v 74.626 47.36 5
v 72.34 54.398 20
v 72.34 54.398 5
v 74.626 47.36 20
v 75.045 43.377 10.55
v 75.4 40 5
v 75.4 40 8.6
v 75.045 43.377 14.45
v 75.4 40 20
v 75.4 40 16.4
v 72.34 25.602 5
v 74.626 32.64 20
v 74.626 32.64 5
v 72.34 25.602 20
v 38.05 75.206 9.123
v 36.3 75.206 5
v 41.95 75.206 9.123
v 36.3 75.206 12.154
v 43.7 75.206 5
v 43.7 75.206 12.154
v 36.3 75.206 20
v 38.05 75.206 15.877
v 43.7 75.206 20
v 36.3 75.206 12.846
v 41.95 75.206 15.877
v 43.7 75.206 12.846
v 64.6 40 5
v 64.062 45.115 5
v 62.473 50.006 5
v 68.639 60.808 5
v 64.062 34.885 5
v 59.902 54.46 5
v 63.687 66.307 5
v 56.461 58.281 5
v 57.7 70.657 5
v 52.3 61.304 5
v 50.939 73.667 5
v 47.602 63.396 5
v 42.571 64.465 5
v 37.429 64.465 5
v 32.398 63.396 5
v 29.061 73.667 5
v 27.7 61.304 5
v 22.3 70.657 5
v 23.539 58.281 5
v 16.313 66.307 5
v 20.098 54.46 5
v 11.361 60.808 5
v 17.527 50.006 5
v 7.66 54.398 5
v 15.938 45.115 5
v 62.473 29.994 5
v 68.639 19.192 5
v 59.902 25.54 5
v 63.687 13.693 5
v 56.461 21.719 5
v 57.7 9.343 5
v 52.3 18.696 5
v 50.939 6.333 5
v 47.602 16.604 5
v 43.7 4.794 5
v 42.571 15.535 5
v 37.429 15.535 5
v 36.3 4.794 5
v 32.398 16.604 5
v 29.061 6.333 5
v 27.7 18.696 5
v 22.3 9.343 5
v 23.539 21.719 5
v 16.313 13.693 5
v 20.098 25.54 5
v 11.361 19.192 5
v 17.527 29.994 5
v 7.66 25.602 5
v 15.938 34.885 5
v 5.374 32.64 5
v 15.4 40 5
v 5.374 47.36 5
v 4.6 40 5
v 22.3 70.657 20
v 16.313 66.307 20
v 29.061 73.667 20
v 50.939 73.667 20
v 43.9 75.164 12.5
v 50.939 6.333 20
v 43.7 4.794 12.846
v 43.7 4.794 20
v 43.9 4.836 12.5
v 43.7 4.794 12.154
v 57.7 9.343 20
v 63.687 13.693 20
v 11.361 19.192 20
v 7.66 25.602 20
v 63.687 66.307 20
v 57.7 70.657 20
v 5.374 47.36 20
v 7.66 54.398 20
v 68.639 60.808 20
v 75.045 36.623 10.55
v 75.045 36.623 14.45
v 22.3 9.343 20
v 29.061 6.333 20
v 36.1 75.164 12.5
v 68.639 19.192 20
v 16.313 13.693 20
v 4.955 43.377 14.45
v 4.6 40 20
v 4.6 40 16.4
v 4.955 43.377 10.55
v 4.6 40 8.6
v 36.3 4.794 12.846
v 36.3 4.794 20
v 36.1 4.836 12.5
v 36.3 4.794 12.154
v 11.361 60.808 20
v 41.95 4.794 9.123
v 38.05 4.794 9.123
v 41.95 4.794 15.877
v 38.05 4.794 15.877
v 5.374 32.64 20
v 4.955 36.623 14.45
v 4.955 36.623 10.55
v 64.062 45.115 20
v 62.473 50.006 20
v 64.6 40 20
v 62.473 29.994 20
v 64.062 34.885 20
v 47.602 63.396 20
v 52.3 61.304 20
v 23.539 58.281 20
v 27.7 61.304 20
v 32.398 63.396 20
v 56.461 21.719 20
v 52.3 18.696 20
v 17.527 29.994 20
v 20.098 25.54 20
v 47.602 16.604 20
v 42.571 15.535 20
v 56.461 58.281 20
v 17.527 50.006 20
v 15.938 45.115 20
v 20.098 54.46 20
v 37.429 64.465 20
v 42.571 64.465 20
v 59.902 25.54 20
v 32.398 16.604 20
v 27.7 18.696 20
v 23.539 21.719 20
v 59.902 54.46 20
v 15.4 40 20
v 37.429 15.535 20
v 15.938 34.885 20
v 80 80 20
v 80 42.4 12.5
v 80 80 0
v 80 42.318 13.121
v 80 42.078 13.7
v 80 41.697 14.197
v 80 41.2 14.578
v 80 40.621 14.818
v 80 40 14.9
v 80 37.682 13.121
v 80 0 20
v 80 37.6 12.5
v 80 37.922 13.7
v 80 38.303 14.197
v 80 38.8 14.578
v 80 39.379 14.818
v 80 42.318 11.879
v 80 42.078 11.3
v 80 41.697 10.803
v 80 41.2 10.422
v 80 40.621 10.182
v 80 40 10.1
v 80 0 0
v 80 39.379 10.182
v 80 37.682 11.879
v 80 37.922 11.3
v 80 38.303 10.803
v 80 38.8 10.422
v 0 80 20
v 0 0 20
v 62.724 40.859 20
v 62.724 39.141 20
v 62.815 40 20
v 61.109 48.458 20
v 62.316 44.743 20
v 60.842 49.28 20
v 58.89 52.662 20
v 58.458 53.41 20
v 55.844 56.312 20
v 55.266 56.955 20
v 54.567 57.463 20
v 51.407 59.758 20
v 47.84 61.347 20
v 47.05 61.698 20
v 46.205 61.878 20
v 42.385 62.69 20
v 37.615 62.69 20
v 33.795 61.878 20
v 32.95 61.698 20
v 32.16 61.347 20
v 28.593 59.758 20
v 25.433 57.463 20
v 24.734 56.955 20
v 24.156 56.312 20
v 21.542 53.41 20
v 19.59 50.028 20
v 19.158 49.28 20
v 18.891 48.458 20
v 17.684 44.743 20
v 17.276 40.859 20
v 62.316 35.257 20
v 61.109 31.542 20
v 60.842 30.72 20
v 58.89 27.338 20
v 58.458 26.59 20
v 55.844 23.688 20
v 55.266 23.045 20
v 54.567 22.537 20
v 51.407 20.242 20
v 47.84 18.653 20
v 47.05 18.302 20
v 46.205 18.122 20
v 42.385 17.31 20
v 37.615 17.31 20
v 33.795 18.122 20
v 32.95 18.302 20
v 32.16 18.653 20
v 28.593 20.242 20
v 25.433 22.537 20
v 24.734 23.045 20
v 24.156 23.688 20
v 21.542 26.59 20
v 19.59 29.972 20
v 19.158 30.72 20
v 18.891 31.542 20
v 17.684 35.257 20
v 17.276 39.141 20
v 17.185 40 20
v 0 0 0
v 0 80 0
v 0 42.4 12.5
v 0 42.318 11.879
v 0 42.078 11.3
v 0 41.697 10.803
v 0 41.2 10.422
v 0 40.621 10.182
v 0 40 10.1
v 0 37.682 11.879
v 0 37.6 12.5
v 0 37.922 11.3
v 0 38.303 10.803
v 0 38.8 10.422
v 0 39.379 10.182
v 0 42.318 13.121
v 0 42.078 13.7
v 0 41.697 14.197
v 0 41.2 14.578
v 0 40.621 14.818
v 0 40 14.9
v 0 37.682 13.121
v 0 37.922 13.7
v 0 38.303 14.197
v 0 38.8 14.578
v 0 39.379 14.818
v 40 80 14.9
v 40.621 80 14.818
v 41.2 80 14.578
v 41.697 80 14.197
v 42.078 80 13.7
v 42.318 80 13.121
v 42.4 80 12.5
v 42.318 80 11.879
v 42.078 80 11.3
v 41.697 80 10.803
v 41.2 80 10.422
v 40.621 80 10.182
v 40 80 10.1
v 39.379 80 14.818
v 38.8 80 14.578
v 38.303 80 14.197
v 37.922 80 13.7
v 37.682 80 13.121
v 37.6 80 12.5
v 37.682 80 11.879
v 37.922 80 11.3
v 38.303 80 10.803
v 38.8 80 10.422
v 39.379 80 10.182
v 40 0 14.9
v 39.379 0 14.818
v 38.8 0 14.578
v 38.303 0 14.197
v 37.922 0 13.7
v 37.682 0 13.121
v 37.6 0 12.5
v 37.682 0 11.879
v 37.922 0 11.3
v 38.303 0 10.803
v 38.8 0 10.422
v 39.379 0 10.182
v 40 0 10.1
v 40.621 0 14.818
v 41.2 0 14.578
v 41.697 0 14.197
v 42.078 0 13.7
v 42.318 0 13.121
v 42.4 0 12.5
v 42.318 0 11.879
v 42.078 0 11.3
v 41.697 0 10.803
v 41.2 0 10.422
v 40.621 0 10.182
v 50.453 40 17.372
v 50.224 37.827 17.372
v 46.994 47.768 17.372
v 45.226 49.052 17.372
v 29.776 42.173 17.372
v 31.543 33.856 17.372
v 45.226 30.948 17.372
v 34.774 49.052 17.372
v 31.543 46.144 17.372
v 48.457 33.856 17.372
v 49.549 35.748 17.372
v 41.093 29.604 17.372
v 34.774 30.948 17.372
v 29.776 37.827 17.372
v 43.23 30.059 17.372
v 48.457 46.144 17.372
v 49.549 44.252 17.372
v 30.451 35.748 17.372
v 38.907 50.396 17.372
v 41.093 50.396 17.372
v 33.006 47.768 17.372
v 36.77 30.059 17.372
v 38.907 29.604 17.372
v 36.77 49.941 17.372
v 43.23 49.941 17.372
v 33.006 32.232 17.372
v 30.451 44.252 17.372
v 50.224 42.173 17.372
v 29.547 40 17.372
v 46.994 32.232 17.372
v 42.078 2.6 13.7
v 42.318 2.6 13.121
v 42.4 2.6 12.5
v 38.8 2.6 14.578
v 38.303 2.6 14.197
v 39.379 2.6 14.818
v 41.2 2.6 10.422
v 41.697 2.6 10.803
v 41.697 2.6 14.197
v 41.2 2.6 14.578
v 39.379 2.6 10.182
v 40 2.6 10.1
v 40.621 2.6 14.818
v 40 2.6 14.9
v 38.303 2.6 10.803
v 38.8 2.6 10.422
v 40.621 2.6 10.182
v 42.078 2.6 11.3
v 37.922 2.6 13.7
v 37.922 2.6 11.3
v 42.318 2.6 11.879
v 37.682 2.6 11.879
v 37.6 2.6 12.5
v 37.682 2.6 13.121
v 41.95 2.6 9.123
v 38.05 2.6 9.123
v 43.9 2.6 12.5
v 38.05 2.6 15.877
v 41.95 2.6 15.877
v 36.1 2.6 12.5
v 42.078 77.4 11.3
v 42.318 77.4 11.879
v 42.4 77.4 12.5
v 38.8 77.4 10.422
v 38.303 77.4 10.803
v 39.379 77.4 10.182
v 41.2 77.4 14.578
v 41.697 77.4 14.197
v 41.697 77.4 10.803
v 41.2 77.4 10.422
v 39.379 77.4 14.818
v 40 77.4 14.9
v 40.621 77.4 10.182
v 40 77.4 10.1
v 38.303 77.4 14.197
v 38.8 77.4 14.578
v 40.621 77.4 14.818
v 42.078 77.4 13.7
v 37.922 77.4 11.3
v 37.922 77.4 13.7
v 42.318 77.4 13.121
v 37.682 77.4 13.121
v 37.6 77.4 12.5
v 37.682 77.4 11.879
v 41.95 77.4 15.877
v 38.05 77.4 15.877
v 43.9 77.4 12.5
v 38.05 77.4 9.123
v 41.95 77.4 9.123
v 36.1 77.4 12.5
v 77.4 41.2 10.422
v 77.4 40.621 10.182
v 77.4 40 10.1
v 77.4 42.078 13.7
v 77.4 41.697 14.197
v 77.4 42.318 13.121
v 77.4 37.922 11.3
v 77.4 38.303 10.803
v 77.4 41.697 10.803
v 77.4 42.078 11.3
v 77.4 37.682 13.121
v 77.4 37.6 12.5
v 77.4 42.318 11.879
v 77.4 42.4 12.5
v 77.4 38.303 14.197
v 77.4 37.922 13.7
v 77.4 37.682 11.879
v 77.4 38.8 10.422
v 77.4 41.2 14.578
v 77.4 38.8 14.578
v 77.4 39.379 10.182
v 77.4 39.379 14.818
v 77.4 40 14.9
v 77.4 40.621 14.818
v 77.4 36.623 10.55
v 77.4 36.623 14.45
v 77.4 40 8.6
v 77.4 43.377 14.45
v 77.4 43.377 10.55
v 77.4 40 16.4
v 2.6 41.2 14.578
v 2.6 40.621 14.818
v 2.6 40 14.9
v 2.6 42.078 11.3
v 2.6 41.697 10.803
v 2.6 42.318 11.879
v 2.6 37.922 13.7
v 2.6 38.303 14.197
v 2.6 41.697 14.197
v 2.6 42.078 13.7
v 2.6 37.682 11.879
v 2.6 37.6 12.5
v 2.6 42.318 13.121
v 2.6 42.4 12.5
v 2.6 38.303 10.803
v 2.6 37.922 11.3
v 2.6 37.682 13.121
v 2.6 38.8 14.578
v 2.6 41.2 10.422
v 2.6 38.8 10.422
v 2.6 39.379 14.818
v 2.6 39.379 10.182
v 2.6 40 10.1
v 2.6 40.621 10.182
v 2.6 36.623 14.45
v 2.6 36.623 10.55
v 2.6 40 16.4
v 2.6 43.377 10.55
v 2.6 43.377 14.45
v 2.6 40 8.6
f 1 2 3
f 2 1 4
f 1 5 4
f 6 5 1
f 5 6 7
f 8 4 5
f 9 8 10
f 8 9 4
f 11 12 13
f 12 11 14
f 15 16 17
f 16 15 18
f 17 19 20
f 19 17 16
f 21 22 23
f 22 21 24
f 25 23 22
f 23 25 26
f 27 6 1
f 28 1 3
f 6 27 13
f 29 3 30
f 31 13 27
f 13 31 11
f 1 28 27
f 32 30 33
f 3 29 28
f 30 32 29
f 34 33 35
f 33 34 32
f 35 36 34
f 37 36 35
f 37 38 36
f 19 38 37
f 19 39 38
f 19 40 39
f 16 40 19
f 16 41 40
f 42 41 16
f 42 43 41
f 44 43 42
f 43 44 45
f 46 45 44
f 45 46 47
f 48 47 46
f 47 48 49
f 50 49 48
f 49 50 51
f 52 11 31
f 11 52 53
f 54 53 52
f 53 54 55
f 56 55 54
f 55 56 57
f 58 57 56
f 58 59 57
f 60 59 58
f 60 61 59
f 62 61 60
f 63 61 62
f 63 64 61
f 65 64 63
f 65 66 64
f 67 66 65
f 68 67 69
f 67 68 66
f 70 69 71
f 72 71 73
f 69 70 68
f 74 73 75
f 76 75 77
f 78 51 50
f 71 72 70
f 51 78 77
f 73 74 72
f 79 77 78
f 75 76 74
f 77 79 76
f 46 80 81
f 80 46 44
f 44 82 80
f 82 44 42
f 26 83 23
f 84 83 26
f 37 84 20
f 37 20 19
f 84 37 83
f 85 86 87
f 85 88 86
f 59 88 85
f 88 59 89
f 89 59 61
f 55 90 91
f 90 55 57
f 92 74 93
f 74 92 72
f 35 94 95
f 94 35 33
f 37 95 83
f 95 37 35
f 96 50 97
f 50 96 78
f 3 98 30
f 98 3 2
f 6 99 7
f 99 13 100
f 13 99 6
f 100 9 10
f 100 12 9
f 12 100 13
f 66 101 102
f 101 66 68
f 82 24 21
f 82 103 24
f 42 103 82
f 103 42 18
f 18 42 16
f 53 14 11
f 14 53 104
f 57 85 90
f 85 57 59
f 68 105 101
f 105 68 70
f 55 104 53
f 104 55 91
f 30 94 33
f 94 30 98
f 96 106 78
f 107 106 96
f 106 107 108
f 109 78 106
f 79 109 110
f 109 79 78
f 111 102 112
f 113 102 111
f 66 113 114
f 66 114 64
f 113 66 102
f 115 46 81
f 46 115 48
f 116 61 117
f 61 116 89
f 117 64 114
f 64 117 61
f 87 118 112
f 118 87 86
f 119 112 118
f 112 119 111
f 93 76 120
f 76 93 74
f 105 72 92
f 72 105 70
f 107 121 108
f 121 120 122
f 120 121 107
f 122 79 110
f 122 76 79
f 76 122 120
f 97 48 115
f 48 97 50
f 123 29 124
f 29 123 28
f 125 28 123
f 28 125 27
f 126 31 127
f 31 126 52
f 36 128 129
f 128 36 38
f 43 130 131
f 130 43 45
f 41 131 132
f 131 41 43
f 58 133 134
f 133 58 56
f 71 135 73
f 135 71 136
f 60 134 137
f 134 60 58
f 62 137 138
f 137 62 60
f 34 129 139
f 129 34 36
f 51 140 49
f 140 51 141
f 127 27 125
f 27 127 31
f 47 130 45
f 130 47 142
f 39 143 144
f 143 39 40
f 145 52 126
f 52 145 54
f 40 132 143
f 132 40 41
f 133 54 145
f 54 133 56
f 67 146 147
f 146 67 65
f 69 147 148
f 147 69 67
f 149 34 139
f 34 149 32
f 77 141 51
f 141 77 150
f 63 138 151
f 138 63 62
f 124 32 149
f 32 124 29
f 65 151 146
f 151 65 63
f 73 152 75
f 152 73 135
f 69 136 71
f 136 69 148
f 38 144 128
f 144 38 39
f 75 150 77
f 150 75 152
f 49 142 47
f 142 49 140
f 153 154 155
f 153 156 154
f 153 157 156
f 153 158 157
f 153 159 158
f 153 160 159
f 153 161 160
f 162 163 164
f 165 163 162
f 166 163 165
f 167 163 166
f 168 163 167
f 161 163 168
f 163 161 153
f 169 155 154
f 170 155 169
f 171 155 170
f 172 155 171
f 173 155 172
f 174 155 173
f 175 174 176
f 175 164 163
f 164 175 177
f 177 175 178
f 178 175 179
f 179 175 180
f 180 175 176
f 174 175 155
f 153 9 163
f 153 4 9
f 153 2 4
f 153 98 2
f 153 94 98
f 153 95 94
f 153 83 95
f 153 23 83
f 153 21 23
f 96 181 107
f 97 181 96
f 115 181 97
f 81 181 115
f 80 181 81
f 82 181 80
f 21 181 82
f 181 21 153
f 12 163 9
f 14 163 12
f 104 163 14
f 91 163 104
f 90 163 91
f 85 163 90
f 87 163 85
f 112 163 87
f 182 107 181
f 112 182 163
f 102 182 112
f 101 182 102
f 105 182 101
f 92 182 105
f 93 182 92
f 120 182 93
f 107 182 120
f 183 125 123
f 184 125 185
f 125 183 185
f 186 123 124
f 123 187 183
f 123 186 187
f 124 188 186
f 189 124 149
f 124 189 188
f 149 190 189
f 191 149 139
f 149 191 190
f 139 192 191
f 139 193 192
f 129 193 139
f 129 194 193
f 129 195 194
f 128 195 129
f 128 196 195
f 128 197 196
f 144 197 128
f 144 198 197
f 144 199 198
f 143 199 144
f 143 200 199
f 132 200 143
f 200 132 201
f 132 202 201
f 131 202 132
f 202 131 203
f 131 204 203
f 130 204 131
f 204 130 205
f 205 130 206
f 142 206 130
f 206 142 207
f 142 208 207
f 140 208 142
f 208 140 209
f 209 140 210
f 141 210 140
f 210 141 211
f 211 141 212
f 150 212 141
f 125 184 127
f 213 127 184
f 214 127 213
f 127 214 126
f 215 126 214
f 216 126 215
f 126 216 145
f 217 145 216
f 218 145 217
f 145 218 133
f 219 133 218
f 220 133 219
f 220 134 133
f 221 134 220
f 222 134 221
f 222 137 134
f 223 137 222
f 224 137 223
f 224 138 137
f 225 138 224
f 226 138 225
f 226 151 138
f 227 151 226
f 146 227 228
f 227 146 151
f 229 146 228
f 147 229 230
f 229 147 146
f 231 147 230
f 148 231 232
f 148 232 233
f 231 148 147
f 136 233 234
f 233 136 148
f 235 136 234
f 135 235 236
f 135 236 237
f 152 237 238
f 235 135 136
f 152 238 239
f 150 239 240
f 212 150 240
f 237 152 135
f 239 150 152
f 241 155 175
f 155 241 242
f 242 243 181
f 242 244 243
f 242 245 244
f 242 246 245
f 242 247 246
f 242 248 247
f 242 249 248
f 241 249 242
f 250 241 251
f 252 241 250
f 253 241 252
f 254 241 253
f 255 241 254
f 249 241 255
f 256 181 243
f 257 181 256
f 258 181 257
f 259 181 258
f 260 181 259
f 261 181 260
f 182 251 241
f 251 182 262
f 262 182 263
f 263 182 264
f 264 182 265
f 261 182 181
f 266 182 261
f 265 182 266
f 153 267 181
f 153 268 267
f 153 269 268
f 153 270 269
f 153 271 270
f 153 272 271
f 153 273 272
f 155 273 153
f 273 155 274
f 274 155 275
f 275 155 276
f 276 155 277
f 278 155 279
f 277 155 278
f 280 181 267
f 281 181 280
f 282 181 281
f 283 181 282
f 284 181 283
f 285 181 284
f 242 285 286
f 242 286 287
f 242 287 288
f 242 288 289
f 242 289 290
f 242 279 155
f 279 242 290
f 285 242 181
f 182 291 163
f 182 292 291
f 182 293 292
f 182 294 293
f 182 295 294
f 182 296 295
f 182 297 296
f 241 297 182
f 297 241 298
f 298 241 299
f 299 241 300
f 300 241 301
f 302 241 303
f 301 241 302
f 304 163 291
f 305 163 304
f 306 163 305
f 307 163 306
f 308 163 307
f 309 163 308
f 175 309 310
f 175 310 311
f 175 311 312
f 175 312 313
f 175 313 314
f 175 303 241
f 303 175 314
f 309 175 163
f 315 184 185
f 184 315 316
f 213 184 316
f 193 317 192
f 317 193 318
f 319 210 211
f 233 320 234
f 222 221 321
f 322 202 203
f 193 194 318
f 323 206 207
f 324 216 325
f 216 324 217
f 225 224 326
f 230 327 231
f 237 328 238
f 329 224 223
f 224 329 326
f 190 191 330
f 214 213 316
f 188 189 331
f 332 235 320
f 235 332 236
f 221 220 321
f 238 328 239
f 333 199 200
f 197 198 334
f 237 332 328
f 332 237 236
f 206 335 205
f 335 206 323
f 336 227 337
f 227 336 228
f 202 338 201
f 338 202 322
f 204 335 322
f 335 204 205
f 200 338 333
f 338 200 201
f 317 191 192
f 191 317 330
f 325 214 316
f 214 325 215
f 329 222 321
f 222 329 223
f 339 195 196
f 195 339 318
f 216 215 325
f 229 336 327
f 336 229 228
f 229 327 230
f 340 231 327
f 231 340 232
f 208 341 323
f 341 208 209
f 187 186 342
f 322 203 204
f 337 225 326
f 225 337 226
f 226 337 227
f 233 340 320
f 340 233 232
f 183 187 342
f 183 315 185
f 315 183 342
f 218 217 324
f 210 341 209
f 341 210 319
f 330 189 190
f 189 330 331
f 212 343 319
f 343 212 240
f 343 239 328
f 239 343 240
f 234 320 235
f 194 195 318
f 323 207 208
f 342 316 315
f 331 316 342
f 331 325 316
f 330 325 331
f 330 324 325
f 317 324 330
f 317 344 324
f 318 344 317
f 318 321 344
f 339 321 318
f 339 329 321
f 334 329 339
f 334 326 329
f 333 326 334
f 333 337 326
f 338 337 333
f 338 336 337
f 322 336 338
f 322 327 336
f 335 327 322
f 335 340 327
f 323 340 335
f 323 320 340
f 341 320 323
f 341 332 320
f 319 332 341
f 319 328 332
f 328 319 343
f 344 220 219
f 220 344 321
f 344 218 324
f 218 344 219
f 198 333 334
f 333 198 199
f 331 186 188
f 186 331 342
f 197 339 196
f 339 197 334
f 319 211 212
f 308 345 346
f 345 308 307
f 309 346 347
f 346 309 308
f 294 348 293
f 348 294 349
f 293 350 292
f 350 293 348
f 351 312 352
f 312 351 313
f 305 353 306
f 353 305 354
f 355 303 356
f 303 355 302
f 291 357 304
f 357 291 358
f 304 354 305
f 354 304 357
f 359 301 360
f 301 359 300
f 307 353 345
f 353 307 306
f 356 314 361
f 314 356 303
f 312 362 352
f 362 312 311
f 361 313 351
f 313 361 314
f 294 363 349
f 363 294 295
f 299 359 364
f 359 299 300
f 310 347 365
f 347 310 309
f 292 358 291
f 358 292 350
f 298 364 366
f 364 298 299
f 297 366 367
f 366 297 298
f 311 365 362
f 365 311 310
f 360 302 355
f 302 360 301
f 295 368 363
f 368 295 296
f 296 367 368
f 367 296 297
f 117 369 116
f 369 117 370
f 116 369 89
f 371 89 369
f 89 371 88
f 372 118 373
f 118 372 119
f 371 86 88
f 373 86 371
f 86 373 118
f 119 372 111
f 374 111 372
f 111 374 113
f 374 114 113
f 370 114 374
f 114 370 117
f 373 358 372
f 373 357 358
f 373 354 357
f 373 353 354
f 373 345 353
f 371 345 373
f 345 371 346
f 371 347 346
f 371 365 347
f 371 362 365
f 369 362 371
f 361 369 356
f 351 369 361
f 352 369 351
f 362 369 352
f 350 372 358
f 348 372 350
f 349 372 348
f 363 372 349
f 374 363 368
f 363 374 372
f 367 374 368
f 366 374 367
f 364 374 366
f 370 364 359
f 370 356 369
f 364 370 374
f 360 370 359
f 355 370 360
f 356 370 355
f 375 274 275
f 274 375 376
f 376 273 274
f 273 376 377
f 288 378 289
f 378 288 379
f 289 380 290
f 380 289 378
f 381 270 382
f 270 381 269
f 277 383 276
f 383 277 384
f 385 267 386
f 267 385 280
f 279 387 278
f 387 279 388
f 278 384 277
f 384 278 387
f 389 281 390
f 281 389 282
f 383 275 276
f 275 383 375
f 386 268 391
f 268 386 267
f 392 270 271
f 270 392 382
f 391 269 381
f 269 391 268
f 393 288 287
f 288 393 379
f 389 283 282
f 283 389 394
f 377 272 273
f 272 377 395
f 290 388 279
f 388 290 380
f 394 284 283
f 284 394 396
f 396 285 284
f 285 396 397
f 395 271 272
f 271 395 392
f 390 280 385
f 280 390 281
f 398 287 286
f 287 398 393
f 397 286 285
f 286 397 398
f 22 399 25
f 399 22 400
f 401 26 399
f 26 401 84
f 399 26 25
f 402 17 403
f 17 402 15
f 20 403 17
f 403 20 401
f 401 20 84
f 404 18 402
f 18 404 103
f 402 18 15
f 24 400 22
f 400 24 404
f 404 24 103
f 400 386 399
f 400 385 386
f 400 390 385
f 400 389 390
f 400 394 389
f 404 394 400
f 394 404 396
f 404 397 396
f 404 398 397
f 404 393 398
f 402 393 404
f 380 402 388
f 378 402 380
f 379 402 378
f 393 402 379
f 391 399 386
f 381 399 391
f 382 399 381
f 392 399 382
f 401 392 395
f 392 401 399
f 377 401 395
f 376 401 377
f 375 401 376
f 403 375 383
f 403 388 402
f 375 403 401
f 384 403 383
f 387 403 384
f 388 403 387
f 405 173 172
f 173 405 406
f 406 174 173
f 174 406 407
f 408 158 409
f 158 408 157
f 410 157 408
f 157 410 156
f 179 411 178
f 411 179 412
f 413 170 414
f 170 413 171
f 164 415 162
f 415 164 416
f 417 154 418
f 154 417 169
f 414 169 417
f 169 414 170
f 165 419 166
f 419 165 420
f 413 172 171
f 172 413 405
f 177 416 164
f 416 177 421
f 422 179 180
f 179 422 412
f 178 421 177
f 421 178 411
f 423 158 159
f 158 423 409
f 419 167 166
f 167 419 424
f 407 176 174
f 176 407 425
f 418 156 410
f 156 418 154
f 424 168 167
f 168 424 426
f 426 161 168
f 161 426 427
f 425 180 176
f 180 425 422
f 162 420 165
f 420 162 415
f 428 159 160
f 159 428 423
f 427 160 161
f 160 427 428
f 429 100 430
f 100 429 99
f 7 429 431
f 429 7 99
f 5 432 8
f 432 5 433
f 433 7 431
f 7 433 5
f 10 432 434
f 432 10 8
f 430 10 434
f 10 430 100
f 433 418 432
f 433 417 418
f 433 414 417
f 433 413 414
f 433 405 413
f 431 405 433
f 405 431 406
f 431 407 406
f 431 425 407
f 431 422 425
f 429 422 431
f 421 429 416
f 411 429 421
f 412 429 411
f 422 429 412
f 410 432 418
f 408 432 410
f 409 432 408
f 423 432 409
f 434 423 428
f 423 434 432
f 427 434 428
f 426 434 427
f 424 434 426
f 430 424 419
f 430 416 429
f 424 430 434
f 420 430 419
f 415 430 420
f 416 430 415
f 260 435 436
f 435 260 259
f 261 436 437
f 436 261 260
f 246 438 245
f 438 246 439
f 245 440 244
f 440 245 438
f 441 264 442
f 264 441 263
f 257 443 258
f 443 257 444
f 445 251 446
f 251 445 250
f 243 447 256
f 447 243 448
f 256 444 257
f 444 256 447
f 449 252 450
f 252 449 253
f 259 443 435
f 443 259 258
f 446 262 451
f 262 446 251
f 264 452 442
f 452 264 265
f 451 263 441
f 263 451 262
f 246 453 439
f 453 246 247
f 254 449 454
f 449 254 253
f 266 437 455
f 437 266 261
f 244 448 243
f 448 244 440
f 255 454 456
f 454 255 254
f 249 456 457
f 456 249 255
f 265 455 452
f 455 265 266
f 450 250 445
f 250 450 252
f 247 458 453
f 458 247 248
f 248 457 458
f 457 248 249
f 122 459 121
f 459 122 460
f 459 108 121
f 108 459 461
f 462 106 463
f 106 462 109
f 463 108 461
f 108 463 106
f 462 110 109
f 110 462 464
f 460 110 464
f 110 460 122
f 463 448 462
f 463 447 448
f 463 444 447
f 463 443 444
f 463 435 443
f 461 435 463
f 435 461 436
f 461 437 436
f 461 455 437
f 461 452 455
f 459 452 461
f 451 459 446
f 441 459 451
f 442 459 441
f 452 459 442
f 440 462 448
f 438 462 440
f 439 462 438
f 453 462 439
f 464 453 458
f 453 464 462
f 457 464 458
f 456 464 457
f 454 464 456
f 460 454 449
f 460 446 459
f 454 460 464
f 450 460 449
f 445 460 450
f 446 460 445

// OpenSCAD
//For printing
EPS = 0.3;
GAP = 0.4;

// Mirror
FOCAL_LENGTH = 50;
RADIUS_OF_CURVATURE = 2 * FOCAL_LENGTH;
DIAMETER = 2 * RADIUS_OF_CURVATURE;

// Box part
HEIGHT_BOX = 20;
WIDTH_BOX = 80;

// Tube
INNER_TUBE = 50;
OUTER_TUBE = 70;
LENGTH_TUBE = 1000;
DEPTH_TUBE = HEIGHT_BOX - 5;

// Mirror
R_SQUARED = RADIUS_OF_CURVATURE * RADIUS_OF_CURVATURE;
ROOT = sqrt(4 * R_SQUARED - (INNER_TUBE * INNER_TUBE));
BIG_SEGMENT = ROOT / 2;
SEGMENT = RADIUS_OF_CURVATURE - BIG_SEGMENT;

// For wing
// Standard constants
M4_SHANK_R = 4.0 / 2 + GAP;
M4_HEAD_R   = 7.0 / 2 + GAP;

// Constants defining the design
HEAD_H   = 3.5;
NUT_H    = 2.5;
LENGTH   = 20.0;
WING_SHANK_R = M4_SHANK_R;            // Wing bolt for locking
WING_HEAD_R   = M4_HEAD_R;
DEPTH   = WIDTH_BOX;
BAR_R = INNER_TUBE / 2 + GAP * 2;


module tube() {
    difference () {
        cylinder(LENGTH_TUBE, OUTER_TUBE / 2 + GAP, OUTER_TUBE / 2 + GAP, 0);
        cylinder(LENGTH_TUBE, INNER_TUBE/2 - GAP, INNER_TUBE/2 - GAP, 0);
    }
}

module holder() {
    difference () {
        cube([WIDTH_BOX, WIDTH_BOX, HEIGHT_BOX], 0);
        translate([WIDTH_BOX / 2, WIDTH_BOX / 2, HEIGHT_BOX - DEPTH_TUBE])
            tube();
    }
}

// Wing nut and bolt tighener
module wing () {
    union () {
        cylinder (r = WING_SHANK_R, h = DEPTH, center = false, $fn = 24);
        cylinder (r = WING_HEAD_R, h = NUT_H + GAP, center = false, $fn = 6);
    }
}

module box () {
    difference () {
        holder();
        translate([WIDTH_BOX / 2, WIDTH_BOX / 2, RADIUS_OF_CURVATURE + HEIGHT_BOX - SEGMENT])
           sphere(r = RADIUS_OF_CURVATURE);
    }
}

module wings () {
    translate ([WIDTH_BOX / 2, NUT_H + 3, HEIGHT_BOX - (DEPTH_TUBE / 2)])
    rotate([90,0,0])
        wing ();
    translate ([WIDTH_BOX / 2, WIDTH_BOX - 3 - NUT_H, HEIGHT_BOX - (DEPTH_TUBE / 2)])
    rotate([270,0,0])
        wing ();
    translate ([WIDTH_BOX - 3 - NUT_H, WIDTH_BOX / 2, HEIGHT_BOX - (DEPTH_TUBE / 2)])
    rotate([0,90,0])
        wing ();
    translate ([NUT_H + 3, WIDTH_BOX / 2, HEIGHT_BOX - (DEPTH_TUBE / 2)])
    rotate([0,270,0])
        wing ();
}

difference() {
    box();
    wings ();
}
